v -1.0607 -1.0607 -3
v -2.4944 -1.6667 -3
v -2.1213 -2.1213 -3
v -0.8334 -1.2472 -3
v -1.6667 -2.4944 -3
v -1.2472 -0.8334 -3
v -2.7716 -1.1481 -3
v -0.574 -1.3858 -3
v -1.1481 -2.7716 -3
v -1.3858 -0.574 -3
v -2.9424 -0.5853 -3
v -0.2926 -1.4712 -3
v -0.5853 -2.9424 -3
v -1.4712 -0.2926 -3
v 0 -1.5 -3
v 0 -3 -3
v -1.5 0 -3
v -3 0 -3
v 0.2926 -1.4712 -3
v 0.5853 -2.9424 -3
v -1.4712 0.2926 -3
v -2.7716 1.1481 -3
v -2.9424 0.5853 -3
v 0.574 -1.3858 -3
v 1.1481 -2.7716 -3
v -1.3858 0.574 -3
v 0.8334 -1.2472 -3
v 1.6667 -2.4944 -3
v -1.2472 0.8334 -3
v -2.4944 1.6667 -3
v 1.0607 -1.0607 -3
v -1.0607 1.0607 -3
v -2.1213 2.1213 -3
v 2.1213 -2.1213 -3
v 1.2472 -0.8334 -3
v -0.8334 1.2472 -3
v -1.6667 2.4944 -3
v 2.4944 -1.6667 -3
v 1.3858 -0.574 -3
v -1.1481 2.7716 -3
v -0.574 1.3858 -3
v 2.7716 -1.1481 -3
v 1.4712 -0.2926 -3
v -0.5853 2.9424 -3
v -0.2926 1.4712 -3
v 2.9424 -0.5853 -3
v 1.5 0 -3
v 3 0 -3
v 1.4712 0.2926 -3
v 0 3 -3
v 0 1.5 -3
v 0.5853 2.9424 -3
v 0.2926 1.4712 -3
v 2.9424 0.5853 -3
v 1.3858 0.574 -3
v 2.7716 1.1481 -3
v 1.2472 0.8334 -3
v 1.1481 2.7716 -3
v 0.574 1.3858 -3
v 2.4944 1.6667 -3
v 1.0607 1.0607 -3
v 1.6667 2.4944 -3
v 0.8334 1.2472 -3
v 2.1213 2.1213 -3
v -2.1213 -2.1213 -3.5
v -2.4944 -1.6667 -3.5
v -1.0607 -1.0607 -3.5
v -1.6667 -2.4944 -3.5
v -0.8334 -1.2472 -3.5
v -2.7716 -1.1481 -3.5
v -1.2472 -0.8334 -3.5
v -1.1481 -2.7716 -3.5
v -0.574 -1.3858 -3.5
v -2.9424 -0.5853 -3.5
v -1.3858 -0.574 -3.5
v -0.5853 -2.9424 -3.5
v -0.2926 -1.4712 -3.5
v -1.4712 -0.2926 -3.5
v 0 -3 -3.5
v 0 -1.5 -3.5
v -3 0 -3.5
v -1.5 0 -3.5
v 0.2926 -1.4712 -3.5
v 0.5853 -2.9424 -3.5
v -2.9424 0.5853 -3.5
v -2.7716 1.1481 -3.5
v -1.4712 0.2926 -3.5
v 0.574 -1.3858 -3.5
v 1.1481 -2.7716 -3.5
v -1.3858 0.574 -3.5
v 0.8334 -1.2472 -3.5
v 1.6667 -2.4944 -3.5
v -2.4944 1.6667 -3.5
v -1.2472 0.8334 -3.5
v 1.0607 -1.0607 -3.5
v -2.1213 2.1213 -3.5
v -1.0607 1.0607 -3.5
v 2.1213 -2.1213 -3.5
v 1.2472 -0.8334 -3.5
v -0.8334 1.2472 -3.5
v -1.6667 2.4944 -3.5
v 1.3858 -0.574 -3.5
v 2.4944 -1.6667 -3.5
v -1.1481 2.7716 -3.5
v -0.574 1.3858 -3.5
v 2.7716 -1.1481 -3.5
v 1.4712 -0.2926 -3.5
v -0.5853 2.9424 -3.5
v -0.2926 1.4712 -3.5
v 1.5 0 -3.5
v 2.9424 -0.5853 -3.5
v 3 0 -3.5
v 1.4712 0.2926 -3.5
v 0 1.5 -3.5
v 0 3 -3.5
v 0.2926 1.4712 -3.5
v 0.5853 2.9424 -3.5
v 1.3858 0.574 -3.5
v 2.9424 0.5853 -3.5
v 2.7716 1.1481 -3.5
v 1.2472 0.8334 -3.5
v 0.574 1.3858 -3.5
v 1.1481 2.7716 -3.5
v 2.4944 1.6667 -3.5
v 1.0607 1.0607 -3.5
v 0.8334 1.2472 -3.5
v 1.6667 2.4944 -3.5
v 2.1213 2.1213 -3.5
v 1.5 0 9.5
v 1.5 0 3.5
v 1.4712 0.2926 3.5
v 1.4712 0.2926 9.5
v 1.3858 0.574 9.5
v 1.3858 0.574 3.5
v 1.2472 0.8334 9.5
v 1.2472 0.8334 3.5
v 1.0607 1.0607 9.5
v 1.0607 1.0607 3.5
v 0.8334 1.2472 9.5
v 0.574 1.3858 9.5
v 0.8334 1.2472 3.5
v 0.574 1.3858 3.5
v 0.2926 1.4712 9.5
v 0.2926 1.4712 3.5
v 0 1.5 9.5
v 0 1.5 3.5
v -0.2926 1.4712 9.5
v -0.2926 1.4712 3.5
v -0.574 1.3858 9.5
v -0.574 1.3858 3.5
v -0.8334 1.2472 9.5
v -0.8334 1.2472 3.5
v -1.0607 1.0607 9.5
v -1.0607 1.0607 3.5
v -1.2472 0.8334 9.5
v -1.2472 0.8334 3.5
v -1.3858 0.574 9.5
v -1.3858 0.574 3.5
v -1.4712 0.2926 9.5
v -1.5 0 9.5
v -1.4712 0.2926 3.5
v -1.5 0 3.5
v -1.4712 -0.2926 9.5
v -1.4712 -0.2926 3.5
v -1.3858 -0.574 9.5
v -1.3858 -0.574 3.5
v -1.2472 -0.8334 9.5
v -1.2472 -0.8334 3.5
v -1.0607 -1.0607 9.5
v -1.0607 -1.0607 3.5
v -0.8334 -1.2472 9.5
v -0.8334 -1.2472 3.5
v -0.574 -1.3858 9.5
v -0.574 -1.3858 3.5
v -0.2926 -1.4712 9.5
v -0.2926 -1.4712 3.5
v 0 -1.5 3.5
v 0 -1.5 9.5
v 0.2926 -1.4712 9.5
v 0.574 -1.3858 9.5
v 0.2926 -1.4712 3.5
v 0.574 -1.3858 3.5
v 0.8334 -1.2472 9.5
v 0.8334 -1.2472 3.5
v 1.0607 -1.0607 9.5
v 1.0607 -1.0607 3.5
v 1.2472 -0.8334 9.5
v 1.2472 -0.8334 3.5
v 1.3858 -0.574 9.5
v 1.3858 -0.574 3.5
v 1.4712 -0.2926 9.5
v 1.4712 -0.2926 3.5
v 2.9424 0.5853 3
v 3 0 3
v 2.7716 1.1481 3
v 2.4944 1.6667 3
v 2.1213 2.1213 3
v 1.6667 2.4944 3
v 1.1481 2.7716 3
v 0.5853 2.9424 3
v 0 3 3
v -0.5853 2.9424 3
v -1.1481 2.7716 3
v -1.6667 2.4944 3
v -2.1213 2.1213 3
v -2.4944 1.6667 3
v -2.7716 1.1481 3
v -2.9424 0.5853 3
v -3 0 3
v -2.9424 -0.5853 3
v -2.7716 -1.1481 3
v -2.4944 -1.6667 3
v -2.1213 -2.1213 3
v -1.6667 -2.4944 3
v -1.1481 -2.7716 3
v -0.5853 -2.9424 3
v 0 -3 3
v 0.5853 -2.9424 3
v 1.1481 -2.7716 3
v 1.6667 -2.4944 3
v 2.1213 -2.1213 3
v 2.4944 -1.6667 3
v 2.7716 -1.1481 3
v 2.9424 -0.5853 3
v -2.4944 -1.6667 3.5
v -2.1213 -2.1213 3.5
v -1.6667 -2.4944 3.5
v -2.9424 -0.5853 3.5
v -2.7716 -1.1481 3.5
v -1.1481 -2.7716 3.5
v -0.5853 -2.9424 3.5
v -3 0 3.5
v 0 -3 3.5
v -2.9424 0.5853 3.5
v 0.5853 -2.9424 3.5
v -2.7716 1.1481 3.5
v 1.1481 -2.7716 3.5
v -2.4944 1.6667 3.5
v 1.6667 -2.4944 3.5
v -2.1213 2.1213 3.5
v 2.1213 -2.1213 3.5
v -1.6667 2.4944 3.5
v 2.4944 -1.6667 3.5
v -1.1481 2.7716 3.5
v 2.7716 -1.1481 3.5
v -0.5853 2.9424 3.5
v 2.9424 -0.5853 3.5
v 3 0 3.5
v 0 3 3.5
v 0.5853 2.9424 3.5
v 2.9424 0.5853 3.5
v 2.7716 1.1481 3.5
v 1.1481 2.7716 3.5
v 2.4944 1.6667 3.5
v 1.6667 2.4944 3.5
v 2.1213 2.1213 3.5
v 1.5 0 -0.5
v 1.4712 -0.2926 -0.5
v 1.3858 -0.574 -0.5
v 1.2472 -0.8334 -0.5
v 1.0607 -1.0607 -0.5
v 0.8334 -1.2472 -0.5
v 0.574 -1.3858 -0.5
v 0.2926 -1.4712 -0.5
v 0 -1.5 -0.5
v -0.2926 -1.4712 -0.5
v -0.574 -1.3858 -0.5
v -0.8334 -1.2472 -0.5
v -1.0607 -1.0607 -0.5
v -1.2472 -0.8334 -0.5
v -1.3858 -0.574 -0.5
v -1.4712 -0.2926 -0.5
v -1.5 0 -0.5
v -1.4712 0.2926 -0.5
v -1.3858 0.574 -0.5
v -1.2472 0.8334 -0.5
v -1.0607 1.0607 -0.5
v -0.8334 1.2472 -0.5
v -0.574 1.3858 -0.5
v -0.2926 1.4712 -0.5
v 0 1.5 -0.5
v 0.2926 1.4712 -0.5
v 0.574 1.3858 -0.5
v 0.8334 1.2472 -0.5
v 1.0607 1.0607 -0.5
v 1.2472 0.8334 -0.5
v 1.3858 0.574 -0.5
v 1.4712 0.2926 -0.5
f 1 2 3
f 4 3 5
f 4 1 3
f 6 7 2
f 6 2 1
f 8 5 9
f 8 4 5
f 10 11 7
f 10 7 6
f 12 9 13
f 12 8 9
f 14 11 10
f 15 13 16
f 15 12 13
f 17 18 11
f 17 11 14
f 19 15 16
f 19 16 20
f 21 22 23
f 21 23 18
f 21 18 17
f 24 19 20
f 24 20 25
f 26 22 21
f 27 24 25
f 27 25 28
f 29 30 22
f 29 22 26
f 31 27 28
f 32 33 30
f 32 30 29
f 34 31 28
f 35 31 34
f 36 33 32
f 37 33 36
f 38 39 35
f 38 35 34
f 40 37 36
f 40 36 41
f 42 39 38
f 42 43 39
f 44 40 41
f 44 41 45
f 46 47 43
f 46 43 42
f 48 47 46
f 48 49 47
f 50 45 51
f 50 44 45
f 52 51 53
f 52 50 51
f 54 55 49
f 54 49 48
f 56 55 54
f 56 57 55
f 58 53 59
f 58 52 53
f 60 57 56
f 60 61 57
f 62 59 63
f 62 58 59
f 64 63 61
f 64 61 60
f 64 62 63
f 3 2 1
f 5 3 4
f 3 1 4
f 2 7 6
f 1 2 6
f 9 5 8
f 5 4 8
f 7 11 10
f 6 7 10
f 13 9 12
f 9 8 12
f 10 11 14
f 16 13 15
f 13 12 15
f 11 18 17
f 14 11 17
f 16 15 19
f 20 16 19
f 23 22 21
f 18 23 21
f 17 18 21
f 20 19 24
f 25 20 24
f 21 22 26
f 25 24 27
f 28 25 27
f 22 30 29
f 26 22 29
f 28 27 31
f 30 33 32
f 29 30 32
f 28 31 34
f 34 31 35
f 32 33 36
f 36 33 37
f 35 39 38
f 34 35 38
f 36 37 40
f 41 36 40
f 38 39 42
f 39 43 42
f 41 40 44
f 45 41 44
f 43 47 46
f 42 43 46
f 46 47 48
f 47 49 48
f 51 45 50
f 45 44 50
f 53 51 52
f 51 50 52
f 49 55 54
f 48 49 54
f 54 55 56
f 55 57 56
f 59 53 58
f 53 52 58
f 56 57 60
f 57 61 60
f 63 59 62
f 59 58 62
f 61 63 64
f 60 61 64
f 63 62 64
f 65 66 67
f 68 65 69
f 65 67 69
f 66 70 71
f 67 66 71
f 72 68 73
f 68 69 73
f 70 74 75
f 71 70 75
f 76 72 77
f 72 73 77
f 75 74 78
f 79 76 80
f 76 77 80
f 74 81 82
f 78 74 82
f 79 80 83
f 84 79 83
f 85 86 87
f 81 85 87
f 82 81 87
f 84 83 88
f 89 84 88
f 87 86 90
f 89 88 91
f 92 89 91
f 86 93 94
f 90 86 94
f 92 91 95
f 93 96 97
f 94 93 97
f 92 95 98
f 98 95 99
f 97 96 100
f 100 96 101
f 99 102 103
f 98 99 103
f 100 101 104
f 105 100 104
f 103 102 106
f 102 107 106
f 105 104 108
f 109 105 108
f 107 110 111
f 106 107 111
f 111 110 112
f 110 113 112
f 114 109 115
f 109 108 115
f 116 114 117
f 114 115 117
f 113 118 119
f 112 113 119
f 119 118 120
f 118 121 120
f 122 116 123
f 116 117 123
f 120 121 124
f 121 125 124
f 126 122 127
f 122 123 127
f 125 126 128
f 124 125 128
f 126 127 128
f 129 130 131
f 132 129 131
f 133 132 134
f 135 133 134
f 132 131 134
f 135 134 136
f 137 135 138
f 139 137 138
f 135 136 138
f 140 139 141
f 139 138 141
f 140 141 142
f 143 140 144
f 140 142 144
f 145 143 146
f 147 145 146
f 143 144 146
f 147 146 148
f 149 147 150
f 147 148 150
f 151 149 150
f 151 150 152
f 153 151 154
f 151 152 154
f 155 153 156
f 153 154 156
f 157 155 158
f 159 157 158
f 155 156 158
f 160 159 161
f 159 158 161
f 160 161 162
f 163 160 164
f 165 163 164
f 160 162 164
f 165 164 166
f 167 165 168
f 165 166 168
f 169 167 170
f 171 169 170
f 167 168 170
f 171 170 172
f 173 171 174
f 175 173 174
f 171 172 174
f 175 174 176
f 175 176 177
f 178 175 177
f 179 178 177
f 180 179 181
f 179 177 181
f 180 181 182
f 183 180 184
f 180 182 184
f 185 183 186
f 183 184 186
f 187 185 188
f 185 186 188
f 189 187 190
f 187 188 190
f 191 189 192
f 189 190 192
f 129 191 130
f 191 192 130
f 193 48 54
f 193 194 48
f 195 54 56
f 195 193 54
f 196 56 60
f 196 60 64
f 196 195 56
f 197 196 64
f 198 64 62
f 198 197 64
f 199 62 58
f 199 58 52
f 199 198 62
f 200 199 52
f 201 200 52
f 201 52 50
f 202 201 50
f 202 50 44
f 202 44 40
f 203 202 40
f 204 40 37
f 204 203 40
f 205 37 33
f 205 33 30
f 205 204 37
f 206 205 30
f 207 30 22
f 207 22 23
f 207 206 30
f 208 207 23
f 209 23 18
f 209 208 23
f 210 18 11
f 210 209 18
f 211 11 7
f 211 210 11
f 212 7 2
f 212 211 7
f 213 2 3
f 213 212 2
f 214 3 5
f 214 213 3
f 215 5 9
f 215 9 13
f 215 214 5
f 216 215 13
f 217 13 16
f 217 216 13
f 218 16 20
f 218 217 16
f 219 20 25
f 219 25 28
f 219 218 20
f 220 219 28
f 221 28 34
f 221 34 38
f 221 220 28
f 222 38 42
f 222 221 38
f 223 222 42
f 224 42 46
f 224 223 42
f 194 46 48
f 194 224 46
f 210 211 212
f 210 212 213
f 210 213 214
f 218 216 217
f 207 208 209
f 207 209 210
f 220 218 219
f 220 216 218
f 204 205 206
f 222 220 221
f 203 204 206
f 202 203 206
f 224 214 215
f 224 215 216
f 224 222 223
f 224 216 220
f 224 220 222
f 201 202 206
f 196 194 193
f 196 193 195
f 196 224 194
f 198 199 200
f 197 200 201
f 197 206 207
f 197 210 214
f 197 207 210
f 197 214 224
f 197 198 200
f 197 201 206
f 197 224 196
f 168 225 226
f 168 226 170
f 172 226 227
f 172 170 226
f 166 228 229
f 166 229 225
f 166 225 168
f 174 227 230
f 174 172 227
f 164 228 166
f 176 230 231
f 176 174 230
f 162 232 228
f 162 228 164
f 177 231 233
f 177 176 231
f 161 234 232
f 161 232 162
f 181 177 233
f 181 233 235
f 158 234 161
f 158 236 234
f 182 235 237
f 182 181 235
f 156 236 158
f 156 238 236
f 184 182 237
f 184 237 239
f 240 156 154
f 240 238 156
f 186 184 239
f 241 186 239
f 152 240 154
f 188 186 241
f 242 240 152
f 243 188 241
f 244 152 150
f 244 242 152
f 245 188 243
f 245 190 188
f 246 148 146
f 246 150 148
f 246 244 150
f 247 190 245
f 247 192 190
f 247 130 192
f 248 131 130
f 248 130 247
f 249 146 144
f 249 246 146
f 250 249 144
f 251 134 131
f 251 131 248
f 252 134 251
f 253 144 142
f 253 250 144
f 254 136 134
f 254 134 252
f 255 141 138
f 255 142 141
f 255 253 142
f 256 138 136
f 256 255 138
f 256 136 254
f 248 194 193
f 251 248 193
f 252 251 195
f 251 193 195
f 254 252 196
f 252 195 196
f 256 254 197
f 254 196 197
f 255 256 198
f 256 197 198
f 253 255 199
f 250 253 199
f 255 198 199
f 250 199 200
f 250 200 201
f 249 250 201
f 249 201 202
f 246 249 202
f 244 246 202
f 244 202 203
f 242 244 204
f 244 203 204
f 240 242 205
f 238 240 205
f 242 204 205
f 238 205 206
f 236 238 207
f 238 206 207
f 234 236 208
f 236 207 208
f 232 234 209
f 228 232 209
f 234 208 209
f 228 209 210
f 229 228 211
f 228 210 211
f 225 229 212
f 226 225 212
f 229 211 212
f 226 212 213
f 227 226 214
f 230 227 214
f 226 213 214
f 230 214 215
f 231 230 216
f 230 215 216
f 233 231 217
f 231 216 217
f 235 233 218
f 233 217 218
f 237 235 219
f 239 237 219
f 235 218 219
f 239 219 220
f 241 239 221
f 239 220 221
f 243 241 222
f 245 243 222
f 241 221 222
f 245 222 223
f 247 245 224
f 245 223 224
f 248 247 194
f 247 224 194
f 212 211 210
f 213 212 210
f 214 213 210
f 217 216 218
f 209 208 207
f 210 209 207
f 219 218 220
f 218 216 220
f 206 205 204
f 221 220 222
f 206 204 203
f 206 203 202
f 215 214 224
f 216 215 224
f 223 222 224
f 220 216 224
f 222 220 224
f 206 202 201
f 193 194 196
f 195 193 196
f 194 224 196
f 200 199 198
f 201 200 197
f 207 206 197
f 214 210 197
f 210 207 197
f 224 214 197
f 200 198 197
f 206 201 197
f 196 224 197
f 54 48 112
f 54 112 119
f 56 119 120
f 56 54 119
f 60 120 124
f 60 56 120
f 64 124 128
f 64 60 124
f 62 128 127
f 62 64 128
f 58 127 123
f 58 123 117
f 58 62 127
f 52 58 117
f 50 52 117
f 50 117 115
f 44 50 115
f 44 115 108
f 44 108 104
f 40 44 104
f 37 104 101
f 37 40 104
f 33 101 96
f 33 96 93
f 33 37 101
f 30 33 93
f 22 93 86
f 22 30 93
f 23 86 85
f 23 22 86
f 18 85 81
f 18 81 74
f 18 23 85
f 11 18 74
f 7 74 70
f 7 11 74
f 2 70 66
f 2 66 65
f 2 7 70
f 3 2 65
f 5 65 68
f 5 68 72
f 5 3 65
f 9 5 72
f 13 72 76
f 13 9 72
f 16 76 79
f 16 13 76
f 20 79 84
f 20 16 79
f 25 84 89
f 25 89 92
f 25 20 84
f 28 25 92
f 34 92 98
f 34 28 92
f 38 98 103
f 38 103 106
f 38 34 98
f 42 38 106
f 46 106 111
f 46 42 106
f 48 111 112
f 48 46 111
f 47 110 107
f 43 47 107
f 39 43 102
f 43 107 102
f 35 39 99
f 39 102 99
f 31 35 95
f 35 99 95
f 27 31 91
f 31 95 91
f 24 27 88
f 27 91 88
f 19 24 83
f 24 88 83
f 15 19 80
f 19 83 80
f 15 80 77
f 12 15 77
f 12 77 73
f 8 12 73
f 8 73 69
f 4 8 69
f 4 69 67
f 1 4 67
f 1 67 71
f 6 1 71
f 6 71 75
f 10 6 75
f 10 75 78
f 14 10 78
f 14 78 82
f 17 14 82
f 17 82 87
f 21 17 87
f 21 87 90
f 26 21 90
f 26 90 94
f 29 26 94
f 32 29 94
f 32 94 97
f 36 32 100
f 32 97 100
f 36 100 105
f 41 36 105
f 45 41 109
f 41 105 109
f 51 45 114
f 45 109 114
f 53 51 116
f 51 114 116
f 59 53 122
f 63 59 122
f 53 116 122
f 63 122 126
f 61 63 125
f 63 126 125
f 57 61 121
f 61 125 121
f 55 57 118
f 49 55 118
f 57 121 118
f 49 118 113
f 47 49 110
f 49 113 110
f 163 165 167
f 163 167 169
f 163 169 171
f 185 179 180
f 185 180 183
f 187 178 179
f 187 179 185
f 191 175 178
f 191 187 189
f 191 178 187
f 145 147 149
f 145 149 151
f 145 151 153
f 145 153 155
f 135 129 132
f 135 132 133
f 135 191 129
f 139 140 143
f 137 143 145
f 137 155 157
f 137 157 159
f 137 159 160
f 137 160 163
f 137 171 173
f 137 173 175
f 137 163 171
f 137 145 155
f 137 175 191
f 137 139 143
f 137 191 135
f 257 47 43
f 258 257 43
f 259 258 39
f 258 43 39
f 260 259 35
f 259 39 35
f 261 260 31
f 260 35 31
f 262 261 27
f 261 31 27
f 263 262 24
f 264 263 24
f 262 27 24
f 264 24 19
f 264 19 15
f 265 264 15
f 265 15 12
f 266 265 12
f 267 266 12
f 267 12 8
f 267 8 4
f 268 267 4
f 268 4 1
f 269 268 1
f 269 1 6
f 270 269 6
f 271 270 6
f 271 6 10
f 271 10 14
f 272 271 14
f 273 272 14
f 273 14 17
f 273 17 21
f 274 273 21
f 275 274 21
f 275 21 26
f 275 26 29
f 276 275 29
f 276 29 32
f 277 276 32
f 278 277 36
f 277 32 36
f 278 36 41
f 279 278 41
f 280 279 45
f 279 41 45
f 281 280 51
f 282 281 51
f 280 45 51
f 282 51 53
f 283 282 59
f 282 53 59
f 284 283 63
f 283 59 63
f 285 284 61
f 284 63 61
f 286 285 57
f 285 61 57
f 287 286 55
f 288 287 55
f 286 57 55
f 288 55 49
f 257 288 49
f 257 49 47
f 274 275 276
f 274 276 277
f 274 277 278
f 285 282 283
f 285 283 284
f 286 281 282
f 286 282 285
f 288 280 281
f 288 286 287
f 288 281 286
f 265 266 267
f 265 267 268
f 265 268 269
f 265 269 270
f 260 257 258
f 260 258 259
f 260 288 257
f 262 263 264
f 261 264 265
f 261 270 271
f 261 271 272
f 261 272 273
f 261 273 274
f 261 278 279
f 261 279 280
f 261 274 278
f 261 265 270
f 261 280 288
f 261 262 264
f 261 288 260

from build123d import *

# Parameters (mm, degrees)
F4_R      = 3
F5_DEPTH  = 3
F6_DEPTH  = 0.5
F7_DEPTH  = 0.5
F8_R      = 1.5
F9_DEPTH  = 6
F10_R     = 1.5
F11_DEPTH = 3


with BuildPart() as f5:
    # F4 (on Top) → F5 (new body, symmetric)
    with BuildSketch(Plane.XY):
        Circle(F4_R)
    extrude(amount=F5_DEPTH, both=True)


with BuildPart() as f6:
    # F6 (new): a face of the model
    f6_faces = [f5.part.faces().sort_by_distance(p)[0] for p in [
        (0, 0, 3),
    ]]
    extrude(f6_faces, amount=F6_DEPTH)

    # F8 (on face) → F9 (join)
    with BuildSketch(Plane.XY.offset(3.5)):
        Circle(F8_R)
    extrude(amount=F9_DEPTH)


with BuildPart() as f7:
    # F7 (new): a face of the model
    f7_faces = [f5.part.faces().sort_by_distance(p)[0] for p in [
        (0, 0, -3),
    ]]
    extrude(f7_faces, amount=F7_DEPTH)


with BuildPart() as f11:
    # F10 (on face) → F11 (new body)
    with BuildSketch(Plane(origin=(0, 0, -3.5), x_dir=(1, 0, 0), z_dir=(0, 0, -1))):
        Circle(F10_R)
    extrude(amount=-F11_DEPTH)


with BuildPart() as f7_1:
    add(f7.part)

    # F12: cut F11
    add(f11.part, mode=Mode.SUBTRACT)


with BuildPart() as f5_1:
    add(f5.part)

    # F12: cut F11
    add(f11.part, mode=Mode.SUBTRACT)


solid = Compound([f6.part, f7_1.part, f5_1.part])
